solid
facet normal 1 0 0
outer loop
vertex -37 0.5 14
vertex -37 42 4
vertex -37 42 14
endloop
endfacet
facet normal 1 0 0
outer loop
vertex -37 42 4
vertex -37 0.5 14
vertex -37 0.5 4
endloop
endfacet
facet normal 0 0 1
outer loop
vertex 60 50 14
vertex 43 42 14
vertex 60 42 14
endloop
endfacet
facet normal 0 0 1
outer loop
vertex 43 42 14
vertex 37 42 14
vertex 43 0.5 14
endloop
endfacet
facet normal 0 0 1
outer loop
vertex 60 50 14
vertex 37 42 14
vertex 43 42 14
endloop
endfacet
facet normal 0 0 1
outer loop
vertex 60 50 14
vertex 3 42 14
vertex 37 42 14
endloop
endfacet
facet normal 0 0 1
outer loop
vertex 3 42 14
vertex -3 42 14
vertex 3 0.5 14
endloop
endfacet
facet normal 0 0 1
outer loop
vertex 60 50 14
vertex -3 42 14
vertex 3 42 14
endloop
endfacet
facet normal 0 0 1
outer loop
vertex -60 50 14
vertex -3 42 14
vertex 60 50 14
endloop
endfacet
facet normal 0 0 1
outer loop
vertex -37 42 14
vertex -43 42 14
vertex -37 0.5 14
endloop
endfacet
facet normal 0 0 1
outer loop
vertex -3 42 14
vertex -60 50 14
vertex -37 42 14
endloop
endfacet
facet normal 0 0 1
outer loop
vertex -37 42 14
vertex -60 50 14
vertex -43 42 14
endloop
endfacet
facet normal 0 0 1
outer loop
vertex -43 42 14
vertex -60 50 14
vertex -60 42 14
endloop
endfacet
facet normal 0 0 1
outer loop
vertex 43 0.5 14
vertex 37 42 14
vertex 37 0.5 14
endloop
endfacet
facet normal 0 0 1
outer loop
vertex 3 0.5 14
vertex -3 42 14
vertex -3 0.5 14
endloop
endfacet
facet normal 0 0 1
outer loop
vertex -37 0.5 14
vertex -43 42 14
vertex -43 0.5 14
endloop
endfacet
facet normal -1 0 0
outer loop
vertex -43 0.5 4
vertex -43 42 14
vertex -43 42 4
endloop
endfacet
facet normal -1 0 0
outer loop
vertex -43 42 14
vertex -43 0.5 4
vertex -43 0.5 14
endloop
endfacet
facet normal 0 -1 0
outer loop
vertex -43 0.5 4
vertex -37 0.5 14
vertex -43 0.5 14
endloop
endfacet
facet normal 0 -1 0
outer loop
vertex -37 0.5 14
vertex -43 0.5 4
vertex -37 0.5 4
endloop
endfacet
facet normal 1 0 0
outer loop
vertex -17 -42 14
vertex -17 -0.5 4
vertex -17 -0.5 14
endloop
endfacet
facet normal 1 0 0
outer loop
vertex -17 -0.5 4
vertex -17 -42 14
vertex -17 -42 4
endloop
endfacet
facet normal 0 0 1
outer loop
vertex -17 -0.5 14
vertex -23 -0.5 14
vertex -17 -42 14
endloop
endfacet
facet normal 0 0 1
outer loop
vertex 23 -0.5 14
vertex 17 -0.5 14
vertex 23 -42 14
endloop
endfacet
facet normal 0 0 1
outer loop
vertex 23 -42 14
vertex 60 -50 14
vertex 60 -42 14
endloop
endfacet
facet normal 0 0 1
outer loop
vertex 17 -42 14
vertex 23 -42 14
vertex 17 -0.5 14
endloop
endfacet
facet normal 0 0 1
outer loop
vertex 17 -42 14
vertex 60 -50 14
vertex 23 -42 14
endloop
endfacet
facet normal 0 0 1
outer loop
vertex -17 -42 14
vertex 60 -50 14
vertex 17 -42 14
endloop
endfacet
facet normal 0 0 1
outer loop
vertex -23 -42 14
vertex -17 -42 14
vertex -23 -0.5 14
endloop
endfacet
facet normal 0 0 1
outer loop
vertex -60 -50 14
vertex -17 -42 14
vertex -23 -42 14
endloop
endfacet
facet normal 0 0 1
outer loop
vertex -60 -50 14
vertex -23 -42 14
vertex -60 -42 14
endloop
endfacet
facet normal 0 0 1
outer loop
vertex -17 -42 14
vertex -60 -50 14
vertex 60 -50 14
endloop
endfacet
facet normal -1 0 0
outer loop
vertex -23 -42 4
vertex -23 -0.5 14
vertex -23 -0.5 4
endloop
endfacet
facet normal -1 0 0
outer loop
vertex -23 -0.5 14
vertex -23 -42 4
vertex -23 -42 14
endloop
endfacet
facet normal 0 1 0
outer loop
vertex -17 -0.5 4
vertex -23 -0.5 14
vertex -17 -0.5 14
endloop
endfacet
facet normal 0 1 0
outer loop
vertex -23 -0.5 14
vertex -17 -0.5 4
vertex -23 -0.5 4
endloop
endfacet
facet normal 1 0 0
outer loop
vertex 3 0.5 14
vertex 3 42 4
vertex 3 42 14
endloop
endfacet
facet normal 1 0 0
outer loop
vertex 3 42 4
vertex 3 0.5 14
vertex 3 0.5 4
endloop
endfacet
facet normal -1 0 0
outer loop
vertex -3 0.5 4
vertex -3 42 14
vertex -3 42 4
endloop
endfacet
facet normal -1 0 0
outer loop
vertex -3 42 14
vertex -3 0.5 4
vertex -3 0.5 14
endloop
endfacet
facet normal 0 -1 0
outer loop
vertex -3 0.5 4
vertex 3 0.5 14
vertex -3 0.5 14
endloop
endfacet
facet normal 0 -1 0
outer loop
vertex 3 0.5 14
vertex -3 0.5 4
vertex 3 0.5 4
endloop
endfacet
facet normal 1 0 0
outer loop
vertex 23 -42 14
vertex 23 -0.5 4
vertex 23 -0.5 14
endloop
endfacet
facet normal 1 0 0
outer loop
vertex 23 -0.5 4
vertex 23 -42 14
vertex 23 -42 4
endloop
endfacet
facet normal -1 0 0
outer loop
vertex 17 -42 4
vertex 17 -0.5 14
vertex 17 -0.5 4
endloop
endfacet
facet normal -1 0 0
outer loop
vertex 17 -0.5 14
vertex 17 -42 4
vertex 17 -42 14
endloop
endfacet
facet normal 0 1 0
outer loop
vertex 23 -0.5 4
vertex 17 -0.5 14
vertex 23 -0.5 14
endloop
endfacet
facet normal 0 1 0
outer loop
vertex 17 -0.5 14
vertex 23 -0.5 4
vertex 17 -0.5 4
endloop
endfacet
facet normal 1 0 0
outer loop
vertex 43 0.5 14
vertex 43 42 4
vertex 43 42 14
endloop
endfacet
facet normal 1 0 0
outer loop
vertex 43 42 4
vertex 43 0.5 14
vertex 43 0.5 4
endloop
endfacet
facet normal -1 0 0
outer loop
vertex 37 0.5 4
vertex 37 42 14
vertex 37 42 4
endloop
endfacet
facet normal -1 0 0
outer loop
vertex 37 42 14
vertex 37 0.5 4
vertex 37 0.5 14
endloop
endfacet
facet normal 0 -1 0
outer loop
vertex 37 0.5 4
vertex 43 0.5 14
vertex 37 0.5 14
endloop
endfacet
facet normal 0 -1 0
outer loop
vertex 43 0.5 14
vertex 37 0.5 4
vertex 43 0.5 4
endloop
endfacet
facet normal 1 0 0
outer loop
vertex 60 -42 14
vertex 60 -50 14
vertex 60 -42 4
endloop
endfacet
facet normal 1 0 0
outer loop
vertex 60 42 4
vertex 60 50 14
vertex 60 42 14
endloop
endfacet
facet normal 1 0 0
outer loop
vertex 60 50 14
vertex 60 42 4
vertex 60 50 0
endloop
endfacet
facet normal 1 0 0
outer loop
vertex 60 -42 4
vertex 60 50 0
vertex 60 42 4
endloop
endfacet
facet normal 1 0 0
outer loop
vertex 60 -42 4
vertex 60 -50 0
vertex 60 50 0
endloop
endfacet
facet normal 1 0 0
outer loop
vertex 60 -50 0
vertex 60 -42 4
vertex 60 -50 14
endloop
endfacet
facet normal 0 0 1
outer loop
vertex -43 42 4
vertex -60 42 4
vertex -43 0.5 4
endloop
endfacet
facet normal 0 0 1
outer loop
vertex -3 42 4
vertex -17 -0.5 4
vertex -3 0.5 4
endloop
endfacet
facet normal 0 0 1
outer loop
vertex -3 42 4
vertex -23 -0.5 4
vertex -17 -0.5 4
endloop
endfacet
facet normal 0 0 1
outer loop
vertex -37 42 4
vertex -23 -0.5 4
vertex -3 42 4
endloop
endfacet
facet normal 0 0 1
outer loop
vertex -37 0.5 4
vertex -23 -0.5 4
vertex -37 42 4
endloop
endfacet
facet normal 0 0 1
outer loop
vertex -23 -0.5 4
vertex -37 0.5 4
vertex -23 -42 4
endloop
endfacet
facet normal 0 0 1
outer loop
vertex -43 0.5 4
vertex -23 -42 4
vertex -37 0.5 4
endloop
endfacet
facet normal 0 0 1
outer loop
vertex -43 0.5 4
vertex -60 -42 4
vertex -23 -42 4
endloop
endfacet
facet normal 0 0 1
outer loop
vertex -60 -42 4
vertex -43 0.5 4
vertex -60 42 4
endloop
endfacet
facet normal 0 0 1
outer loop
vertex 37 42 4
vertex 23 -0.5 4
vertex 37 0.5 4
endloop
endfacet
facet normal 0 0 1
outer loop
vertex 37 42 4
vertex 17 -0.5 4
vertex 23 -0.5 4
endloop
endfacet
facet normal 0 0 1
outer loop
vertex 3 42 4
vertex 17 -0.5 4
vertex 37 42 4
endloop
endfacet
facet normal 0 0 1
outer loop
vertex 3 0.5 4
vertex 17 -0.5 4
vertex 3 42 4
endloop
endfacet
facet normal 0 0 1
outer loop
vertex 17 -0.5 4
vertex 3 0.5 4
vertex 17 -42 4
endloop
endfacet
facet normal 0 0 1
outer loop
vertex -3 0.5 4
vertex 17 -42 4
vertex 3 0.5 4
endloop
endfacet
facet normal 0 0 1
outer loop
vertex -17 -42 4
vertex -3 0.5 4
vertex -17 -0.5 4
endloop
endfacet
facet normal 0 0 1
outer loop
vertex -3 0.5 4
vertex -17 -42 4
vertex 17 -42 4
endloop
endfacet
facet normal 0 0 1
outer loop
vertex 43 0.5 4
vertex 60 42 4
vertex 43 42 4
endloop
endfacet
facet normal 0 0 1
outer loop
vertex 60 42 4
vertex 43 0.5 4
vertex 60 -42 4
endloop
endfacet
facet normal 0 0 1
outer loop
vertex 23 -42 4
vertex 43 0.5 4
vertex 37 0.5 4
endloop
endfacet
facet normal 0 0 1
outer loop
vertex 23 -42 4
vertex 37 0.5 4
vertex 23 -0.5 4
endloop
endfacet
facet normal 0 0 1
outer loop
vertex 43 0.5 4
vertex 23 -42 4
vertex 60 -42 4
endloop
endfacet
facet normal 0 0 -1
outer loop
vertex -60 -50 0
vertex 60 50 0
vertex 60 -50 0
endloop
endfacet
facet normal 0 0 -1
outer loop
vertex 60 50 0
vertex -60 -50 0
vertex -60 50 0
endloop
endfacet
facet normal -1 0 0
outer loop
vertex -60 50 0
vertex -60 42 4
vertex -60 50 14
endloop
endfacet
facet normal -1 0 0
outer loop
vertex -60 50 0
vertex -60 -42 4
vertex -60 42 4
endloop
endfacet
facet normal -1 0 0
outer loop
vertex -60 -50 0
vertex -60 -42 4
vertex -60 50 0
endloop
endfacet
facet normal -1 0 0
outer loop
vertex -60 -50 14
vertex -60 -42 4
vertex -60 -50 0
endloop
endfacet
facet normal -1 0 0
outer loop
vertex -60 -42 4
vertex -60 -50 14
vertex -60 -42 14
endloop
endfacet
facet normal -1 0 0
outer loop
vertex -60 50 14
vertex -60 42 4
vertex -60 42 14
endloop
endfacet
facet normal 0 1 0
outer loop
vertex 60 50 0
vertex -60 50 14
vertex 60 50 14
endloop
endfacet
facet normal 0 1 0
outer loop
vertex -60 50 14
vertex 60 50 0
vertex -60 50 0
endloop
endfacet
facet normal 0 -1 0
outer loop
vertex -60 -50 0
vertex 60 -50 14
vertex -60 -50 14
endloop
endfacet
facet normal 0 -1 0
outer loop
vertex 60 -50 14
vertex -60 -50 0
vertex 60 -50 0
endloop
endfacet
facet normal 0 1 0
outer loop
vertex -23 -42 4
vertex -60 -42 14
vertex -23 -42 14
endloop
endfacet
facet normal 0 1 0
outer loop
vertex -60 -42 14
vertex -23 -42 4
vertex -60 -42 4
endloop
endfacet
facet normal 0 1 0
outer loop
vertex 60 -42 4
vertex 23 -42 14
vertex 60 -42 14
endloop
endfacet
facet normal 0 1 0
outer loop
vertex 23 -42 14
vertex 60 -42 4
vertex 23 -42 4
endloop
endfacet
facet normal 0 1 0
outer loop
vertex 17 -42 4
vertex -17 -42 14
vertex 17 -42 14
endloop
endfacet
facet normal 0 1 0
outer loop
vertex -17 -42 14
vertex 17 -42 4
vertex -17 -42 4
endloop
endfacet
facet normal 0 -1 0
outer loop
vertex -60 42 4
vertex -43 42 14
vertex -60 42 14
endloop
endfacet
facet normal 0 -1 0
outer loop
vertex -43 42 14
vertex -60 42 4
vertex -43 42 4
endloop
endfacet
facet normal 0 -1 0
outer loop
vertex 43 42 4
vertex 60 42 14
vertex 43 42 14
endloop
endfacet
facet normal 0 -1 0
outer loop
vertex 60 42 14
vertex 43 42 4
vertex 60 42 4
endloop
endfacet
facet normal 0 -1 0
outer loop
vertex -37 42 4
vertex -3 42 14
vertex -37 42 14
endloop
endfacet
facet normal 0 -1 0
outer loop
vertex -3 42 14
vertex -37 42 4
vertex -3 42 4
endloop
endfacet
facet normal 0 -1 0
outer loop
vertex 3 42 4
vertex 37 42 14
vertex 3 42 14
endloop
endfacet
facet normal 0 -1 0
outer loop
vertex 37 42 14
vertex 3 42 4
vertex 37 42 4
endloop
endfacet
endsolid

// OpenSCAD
$fn = 32;

// ----------------------------------------------------------------------
// Rib frame 120 x 100 x 14
// 5 ribs at 20 mm pitch, staggered
// ----------------------------------------------------------------------

// --- parameters (mm) ---
frame = [120, 100, 4];  // base plate size (x, y, z)
rail_w = 8;             // side rail width
ribs = 5;               // number of ribs
rib_t = 6;              // rib thickness
rib_h = 10;             // rib height above the base plate
pitch = 20;             // pitch between rib centres

// --- derived feature positions (mm) ---
span = (ribs - 1) * pitch;          // = 80   distance between the outer ribs
origin_x = -span / 2;               // = -40   X of the first rib
rib_len = frame[1] / 2 - rail_w + 0.5;  // = 42.5   length of a staggered rib
rib_y = 0.5 + rib_len / 2;          // = 21.75   Y of a staggered rib centre
row_offset = 2 * rib_y;             // = 43.5   distance between the two rows
feature_centers = [
  [origin_x + 0 * pitch, rib_y],
  [origin_x + 1 * pitch, -rib_y],
  [origin_x + 2 * pitch, rib_y],
  [origin_x + 3 * pitch, -rib_y],
  [origin_x + 4 * pitch, rib_y]
];   // rib centre line, drives the rib loop

// base plate, two side rails, then the ribs read straight off feature_centers
union() {
  translate([-frame[0] / 2, -frame[1] / 2, 0]) cube(frame);
  translate([-frame[0] / 2, -frame[1] / 2, 0]) cube([frame[0], rail_w, frame[2] + rib_h]);
  translate([-frame[0] / 2, frame[1] / 2 - rail_w, 0]) cube([frame[0], rail_w, frame[2] + rib_h]);
  for (centre = feature_centers)
    translate([centre[0] - rib_t / 2, centre[1] - rib_len / 2, frame[2] - 1])
      cube([rib_t, rib_len, rib_h + 1]);
}
